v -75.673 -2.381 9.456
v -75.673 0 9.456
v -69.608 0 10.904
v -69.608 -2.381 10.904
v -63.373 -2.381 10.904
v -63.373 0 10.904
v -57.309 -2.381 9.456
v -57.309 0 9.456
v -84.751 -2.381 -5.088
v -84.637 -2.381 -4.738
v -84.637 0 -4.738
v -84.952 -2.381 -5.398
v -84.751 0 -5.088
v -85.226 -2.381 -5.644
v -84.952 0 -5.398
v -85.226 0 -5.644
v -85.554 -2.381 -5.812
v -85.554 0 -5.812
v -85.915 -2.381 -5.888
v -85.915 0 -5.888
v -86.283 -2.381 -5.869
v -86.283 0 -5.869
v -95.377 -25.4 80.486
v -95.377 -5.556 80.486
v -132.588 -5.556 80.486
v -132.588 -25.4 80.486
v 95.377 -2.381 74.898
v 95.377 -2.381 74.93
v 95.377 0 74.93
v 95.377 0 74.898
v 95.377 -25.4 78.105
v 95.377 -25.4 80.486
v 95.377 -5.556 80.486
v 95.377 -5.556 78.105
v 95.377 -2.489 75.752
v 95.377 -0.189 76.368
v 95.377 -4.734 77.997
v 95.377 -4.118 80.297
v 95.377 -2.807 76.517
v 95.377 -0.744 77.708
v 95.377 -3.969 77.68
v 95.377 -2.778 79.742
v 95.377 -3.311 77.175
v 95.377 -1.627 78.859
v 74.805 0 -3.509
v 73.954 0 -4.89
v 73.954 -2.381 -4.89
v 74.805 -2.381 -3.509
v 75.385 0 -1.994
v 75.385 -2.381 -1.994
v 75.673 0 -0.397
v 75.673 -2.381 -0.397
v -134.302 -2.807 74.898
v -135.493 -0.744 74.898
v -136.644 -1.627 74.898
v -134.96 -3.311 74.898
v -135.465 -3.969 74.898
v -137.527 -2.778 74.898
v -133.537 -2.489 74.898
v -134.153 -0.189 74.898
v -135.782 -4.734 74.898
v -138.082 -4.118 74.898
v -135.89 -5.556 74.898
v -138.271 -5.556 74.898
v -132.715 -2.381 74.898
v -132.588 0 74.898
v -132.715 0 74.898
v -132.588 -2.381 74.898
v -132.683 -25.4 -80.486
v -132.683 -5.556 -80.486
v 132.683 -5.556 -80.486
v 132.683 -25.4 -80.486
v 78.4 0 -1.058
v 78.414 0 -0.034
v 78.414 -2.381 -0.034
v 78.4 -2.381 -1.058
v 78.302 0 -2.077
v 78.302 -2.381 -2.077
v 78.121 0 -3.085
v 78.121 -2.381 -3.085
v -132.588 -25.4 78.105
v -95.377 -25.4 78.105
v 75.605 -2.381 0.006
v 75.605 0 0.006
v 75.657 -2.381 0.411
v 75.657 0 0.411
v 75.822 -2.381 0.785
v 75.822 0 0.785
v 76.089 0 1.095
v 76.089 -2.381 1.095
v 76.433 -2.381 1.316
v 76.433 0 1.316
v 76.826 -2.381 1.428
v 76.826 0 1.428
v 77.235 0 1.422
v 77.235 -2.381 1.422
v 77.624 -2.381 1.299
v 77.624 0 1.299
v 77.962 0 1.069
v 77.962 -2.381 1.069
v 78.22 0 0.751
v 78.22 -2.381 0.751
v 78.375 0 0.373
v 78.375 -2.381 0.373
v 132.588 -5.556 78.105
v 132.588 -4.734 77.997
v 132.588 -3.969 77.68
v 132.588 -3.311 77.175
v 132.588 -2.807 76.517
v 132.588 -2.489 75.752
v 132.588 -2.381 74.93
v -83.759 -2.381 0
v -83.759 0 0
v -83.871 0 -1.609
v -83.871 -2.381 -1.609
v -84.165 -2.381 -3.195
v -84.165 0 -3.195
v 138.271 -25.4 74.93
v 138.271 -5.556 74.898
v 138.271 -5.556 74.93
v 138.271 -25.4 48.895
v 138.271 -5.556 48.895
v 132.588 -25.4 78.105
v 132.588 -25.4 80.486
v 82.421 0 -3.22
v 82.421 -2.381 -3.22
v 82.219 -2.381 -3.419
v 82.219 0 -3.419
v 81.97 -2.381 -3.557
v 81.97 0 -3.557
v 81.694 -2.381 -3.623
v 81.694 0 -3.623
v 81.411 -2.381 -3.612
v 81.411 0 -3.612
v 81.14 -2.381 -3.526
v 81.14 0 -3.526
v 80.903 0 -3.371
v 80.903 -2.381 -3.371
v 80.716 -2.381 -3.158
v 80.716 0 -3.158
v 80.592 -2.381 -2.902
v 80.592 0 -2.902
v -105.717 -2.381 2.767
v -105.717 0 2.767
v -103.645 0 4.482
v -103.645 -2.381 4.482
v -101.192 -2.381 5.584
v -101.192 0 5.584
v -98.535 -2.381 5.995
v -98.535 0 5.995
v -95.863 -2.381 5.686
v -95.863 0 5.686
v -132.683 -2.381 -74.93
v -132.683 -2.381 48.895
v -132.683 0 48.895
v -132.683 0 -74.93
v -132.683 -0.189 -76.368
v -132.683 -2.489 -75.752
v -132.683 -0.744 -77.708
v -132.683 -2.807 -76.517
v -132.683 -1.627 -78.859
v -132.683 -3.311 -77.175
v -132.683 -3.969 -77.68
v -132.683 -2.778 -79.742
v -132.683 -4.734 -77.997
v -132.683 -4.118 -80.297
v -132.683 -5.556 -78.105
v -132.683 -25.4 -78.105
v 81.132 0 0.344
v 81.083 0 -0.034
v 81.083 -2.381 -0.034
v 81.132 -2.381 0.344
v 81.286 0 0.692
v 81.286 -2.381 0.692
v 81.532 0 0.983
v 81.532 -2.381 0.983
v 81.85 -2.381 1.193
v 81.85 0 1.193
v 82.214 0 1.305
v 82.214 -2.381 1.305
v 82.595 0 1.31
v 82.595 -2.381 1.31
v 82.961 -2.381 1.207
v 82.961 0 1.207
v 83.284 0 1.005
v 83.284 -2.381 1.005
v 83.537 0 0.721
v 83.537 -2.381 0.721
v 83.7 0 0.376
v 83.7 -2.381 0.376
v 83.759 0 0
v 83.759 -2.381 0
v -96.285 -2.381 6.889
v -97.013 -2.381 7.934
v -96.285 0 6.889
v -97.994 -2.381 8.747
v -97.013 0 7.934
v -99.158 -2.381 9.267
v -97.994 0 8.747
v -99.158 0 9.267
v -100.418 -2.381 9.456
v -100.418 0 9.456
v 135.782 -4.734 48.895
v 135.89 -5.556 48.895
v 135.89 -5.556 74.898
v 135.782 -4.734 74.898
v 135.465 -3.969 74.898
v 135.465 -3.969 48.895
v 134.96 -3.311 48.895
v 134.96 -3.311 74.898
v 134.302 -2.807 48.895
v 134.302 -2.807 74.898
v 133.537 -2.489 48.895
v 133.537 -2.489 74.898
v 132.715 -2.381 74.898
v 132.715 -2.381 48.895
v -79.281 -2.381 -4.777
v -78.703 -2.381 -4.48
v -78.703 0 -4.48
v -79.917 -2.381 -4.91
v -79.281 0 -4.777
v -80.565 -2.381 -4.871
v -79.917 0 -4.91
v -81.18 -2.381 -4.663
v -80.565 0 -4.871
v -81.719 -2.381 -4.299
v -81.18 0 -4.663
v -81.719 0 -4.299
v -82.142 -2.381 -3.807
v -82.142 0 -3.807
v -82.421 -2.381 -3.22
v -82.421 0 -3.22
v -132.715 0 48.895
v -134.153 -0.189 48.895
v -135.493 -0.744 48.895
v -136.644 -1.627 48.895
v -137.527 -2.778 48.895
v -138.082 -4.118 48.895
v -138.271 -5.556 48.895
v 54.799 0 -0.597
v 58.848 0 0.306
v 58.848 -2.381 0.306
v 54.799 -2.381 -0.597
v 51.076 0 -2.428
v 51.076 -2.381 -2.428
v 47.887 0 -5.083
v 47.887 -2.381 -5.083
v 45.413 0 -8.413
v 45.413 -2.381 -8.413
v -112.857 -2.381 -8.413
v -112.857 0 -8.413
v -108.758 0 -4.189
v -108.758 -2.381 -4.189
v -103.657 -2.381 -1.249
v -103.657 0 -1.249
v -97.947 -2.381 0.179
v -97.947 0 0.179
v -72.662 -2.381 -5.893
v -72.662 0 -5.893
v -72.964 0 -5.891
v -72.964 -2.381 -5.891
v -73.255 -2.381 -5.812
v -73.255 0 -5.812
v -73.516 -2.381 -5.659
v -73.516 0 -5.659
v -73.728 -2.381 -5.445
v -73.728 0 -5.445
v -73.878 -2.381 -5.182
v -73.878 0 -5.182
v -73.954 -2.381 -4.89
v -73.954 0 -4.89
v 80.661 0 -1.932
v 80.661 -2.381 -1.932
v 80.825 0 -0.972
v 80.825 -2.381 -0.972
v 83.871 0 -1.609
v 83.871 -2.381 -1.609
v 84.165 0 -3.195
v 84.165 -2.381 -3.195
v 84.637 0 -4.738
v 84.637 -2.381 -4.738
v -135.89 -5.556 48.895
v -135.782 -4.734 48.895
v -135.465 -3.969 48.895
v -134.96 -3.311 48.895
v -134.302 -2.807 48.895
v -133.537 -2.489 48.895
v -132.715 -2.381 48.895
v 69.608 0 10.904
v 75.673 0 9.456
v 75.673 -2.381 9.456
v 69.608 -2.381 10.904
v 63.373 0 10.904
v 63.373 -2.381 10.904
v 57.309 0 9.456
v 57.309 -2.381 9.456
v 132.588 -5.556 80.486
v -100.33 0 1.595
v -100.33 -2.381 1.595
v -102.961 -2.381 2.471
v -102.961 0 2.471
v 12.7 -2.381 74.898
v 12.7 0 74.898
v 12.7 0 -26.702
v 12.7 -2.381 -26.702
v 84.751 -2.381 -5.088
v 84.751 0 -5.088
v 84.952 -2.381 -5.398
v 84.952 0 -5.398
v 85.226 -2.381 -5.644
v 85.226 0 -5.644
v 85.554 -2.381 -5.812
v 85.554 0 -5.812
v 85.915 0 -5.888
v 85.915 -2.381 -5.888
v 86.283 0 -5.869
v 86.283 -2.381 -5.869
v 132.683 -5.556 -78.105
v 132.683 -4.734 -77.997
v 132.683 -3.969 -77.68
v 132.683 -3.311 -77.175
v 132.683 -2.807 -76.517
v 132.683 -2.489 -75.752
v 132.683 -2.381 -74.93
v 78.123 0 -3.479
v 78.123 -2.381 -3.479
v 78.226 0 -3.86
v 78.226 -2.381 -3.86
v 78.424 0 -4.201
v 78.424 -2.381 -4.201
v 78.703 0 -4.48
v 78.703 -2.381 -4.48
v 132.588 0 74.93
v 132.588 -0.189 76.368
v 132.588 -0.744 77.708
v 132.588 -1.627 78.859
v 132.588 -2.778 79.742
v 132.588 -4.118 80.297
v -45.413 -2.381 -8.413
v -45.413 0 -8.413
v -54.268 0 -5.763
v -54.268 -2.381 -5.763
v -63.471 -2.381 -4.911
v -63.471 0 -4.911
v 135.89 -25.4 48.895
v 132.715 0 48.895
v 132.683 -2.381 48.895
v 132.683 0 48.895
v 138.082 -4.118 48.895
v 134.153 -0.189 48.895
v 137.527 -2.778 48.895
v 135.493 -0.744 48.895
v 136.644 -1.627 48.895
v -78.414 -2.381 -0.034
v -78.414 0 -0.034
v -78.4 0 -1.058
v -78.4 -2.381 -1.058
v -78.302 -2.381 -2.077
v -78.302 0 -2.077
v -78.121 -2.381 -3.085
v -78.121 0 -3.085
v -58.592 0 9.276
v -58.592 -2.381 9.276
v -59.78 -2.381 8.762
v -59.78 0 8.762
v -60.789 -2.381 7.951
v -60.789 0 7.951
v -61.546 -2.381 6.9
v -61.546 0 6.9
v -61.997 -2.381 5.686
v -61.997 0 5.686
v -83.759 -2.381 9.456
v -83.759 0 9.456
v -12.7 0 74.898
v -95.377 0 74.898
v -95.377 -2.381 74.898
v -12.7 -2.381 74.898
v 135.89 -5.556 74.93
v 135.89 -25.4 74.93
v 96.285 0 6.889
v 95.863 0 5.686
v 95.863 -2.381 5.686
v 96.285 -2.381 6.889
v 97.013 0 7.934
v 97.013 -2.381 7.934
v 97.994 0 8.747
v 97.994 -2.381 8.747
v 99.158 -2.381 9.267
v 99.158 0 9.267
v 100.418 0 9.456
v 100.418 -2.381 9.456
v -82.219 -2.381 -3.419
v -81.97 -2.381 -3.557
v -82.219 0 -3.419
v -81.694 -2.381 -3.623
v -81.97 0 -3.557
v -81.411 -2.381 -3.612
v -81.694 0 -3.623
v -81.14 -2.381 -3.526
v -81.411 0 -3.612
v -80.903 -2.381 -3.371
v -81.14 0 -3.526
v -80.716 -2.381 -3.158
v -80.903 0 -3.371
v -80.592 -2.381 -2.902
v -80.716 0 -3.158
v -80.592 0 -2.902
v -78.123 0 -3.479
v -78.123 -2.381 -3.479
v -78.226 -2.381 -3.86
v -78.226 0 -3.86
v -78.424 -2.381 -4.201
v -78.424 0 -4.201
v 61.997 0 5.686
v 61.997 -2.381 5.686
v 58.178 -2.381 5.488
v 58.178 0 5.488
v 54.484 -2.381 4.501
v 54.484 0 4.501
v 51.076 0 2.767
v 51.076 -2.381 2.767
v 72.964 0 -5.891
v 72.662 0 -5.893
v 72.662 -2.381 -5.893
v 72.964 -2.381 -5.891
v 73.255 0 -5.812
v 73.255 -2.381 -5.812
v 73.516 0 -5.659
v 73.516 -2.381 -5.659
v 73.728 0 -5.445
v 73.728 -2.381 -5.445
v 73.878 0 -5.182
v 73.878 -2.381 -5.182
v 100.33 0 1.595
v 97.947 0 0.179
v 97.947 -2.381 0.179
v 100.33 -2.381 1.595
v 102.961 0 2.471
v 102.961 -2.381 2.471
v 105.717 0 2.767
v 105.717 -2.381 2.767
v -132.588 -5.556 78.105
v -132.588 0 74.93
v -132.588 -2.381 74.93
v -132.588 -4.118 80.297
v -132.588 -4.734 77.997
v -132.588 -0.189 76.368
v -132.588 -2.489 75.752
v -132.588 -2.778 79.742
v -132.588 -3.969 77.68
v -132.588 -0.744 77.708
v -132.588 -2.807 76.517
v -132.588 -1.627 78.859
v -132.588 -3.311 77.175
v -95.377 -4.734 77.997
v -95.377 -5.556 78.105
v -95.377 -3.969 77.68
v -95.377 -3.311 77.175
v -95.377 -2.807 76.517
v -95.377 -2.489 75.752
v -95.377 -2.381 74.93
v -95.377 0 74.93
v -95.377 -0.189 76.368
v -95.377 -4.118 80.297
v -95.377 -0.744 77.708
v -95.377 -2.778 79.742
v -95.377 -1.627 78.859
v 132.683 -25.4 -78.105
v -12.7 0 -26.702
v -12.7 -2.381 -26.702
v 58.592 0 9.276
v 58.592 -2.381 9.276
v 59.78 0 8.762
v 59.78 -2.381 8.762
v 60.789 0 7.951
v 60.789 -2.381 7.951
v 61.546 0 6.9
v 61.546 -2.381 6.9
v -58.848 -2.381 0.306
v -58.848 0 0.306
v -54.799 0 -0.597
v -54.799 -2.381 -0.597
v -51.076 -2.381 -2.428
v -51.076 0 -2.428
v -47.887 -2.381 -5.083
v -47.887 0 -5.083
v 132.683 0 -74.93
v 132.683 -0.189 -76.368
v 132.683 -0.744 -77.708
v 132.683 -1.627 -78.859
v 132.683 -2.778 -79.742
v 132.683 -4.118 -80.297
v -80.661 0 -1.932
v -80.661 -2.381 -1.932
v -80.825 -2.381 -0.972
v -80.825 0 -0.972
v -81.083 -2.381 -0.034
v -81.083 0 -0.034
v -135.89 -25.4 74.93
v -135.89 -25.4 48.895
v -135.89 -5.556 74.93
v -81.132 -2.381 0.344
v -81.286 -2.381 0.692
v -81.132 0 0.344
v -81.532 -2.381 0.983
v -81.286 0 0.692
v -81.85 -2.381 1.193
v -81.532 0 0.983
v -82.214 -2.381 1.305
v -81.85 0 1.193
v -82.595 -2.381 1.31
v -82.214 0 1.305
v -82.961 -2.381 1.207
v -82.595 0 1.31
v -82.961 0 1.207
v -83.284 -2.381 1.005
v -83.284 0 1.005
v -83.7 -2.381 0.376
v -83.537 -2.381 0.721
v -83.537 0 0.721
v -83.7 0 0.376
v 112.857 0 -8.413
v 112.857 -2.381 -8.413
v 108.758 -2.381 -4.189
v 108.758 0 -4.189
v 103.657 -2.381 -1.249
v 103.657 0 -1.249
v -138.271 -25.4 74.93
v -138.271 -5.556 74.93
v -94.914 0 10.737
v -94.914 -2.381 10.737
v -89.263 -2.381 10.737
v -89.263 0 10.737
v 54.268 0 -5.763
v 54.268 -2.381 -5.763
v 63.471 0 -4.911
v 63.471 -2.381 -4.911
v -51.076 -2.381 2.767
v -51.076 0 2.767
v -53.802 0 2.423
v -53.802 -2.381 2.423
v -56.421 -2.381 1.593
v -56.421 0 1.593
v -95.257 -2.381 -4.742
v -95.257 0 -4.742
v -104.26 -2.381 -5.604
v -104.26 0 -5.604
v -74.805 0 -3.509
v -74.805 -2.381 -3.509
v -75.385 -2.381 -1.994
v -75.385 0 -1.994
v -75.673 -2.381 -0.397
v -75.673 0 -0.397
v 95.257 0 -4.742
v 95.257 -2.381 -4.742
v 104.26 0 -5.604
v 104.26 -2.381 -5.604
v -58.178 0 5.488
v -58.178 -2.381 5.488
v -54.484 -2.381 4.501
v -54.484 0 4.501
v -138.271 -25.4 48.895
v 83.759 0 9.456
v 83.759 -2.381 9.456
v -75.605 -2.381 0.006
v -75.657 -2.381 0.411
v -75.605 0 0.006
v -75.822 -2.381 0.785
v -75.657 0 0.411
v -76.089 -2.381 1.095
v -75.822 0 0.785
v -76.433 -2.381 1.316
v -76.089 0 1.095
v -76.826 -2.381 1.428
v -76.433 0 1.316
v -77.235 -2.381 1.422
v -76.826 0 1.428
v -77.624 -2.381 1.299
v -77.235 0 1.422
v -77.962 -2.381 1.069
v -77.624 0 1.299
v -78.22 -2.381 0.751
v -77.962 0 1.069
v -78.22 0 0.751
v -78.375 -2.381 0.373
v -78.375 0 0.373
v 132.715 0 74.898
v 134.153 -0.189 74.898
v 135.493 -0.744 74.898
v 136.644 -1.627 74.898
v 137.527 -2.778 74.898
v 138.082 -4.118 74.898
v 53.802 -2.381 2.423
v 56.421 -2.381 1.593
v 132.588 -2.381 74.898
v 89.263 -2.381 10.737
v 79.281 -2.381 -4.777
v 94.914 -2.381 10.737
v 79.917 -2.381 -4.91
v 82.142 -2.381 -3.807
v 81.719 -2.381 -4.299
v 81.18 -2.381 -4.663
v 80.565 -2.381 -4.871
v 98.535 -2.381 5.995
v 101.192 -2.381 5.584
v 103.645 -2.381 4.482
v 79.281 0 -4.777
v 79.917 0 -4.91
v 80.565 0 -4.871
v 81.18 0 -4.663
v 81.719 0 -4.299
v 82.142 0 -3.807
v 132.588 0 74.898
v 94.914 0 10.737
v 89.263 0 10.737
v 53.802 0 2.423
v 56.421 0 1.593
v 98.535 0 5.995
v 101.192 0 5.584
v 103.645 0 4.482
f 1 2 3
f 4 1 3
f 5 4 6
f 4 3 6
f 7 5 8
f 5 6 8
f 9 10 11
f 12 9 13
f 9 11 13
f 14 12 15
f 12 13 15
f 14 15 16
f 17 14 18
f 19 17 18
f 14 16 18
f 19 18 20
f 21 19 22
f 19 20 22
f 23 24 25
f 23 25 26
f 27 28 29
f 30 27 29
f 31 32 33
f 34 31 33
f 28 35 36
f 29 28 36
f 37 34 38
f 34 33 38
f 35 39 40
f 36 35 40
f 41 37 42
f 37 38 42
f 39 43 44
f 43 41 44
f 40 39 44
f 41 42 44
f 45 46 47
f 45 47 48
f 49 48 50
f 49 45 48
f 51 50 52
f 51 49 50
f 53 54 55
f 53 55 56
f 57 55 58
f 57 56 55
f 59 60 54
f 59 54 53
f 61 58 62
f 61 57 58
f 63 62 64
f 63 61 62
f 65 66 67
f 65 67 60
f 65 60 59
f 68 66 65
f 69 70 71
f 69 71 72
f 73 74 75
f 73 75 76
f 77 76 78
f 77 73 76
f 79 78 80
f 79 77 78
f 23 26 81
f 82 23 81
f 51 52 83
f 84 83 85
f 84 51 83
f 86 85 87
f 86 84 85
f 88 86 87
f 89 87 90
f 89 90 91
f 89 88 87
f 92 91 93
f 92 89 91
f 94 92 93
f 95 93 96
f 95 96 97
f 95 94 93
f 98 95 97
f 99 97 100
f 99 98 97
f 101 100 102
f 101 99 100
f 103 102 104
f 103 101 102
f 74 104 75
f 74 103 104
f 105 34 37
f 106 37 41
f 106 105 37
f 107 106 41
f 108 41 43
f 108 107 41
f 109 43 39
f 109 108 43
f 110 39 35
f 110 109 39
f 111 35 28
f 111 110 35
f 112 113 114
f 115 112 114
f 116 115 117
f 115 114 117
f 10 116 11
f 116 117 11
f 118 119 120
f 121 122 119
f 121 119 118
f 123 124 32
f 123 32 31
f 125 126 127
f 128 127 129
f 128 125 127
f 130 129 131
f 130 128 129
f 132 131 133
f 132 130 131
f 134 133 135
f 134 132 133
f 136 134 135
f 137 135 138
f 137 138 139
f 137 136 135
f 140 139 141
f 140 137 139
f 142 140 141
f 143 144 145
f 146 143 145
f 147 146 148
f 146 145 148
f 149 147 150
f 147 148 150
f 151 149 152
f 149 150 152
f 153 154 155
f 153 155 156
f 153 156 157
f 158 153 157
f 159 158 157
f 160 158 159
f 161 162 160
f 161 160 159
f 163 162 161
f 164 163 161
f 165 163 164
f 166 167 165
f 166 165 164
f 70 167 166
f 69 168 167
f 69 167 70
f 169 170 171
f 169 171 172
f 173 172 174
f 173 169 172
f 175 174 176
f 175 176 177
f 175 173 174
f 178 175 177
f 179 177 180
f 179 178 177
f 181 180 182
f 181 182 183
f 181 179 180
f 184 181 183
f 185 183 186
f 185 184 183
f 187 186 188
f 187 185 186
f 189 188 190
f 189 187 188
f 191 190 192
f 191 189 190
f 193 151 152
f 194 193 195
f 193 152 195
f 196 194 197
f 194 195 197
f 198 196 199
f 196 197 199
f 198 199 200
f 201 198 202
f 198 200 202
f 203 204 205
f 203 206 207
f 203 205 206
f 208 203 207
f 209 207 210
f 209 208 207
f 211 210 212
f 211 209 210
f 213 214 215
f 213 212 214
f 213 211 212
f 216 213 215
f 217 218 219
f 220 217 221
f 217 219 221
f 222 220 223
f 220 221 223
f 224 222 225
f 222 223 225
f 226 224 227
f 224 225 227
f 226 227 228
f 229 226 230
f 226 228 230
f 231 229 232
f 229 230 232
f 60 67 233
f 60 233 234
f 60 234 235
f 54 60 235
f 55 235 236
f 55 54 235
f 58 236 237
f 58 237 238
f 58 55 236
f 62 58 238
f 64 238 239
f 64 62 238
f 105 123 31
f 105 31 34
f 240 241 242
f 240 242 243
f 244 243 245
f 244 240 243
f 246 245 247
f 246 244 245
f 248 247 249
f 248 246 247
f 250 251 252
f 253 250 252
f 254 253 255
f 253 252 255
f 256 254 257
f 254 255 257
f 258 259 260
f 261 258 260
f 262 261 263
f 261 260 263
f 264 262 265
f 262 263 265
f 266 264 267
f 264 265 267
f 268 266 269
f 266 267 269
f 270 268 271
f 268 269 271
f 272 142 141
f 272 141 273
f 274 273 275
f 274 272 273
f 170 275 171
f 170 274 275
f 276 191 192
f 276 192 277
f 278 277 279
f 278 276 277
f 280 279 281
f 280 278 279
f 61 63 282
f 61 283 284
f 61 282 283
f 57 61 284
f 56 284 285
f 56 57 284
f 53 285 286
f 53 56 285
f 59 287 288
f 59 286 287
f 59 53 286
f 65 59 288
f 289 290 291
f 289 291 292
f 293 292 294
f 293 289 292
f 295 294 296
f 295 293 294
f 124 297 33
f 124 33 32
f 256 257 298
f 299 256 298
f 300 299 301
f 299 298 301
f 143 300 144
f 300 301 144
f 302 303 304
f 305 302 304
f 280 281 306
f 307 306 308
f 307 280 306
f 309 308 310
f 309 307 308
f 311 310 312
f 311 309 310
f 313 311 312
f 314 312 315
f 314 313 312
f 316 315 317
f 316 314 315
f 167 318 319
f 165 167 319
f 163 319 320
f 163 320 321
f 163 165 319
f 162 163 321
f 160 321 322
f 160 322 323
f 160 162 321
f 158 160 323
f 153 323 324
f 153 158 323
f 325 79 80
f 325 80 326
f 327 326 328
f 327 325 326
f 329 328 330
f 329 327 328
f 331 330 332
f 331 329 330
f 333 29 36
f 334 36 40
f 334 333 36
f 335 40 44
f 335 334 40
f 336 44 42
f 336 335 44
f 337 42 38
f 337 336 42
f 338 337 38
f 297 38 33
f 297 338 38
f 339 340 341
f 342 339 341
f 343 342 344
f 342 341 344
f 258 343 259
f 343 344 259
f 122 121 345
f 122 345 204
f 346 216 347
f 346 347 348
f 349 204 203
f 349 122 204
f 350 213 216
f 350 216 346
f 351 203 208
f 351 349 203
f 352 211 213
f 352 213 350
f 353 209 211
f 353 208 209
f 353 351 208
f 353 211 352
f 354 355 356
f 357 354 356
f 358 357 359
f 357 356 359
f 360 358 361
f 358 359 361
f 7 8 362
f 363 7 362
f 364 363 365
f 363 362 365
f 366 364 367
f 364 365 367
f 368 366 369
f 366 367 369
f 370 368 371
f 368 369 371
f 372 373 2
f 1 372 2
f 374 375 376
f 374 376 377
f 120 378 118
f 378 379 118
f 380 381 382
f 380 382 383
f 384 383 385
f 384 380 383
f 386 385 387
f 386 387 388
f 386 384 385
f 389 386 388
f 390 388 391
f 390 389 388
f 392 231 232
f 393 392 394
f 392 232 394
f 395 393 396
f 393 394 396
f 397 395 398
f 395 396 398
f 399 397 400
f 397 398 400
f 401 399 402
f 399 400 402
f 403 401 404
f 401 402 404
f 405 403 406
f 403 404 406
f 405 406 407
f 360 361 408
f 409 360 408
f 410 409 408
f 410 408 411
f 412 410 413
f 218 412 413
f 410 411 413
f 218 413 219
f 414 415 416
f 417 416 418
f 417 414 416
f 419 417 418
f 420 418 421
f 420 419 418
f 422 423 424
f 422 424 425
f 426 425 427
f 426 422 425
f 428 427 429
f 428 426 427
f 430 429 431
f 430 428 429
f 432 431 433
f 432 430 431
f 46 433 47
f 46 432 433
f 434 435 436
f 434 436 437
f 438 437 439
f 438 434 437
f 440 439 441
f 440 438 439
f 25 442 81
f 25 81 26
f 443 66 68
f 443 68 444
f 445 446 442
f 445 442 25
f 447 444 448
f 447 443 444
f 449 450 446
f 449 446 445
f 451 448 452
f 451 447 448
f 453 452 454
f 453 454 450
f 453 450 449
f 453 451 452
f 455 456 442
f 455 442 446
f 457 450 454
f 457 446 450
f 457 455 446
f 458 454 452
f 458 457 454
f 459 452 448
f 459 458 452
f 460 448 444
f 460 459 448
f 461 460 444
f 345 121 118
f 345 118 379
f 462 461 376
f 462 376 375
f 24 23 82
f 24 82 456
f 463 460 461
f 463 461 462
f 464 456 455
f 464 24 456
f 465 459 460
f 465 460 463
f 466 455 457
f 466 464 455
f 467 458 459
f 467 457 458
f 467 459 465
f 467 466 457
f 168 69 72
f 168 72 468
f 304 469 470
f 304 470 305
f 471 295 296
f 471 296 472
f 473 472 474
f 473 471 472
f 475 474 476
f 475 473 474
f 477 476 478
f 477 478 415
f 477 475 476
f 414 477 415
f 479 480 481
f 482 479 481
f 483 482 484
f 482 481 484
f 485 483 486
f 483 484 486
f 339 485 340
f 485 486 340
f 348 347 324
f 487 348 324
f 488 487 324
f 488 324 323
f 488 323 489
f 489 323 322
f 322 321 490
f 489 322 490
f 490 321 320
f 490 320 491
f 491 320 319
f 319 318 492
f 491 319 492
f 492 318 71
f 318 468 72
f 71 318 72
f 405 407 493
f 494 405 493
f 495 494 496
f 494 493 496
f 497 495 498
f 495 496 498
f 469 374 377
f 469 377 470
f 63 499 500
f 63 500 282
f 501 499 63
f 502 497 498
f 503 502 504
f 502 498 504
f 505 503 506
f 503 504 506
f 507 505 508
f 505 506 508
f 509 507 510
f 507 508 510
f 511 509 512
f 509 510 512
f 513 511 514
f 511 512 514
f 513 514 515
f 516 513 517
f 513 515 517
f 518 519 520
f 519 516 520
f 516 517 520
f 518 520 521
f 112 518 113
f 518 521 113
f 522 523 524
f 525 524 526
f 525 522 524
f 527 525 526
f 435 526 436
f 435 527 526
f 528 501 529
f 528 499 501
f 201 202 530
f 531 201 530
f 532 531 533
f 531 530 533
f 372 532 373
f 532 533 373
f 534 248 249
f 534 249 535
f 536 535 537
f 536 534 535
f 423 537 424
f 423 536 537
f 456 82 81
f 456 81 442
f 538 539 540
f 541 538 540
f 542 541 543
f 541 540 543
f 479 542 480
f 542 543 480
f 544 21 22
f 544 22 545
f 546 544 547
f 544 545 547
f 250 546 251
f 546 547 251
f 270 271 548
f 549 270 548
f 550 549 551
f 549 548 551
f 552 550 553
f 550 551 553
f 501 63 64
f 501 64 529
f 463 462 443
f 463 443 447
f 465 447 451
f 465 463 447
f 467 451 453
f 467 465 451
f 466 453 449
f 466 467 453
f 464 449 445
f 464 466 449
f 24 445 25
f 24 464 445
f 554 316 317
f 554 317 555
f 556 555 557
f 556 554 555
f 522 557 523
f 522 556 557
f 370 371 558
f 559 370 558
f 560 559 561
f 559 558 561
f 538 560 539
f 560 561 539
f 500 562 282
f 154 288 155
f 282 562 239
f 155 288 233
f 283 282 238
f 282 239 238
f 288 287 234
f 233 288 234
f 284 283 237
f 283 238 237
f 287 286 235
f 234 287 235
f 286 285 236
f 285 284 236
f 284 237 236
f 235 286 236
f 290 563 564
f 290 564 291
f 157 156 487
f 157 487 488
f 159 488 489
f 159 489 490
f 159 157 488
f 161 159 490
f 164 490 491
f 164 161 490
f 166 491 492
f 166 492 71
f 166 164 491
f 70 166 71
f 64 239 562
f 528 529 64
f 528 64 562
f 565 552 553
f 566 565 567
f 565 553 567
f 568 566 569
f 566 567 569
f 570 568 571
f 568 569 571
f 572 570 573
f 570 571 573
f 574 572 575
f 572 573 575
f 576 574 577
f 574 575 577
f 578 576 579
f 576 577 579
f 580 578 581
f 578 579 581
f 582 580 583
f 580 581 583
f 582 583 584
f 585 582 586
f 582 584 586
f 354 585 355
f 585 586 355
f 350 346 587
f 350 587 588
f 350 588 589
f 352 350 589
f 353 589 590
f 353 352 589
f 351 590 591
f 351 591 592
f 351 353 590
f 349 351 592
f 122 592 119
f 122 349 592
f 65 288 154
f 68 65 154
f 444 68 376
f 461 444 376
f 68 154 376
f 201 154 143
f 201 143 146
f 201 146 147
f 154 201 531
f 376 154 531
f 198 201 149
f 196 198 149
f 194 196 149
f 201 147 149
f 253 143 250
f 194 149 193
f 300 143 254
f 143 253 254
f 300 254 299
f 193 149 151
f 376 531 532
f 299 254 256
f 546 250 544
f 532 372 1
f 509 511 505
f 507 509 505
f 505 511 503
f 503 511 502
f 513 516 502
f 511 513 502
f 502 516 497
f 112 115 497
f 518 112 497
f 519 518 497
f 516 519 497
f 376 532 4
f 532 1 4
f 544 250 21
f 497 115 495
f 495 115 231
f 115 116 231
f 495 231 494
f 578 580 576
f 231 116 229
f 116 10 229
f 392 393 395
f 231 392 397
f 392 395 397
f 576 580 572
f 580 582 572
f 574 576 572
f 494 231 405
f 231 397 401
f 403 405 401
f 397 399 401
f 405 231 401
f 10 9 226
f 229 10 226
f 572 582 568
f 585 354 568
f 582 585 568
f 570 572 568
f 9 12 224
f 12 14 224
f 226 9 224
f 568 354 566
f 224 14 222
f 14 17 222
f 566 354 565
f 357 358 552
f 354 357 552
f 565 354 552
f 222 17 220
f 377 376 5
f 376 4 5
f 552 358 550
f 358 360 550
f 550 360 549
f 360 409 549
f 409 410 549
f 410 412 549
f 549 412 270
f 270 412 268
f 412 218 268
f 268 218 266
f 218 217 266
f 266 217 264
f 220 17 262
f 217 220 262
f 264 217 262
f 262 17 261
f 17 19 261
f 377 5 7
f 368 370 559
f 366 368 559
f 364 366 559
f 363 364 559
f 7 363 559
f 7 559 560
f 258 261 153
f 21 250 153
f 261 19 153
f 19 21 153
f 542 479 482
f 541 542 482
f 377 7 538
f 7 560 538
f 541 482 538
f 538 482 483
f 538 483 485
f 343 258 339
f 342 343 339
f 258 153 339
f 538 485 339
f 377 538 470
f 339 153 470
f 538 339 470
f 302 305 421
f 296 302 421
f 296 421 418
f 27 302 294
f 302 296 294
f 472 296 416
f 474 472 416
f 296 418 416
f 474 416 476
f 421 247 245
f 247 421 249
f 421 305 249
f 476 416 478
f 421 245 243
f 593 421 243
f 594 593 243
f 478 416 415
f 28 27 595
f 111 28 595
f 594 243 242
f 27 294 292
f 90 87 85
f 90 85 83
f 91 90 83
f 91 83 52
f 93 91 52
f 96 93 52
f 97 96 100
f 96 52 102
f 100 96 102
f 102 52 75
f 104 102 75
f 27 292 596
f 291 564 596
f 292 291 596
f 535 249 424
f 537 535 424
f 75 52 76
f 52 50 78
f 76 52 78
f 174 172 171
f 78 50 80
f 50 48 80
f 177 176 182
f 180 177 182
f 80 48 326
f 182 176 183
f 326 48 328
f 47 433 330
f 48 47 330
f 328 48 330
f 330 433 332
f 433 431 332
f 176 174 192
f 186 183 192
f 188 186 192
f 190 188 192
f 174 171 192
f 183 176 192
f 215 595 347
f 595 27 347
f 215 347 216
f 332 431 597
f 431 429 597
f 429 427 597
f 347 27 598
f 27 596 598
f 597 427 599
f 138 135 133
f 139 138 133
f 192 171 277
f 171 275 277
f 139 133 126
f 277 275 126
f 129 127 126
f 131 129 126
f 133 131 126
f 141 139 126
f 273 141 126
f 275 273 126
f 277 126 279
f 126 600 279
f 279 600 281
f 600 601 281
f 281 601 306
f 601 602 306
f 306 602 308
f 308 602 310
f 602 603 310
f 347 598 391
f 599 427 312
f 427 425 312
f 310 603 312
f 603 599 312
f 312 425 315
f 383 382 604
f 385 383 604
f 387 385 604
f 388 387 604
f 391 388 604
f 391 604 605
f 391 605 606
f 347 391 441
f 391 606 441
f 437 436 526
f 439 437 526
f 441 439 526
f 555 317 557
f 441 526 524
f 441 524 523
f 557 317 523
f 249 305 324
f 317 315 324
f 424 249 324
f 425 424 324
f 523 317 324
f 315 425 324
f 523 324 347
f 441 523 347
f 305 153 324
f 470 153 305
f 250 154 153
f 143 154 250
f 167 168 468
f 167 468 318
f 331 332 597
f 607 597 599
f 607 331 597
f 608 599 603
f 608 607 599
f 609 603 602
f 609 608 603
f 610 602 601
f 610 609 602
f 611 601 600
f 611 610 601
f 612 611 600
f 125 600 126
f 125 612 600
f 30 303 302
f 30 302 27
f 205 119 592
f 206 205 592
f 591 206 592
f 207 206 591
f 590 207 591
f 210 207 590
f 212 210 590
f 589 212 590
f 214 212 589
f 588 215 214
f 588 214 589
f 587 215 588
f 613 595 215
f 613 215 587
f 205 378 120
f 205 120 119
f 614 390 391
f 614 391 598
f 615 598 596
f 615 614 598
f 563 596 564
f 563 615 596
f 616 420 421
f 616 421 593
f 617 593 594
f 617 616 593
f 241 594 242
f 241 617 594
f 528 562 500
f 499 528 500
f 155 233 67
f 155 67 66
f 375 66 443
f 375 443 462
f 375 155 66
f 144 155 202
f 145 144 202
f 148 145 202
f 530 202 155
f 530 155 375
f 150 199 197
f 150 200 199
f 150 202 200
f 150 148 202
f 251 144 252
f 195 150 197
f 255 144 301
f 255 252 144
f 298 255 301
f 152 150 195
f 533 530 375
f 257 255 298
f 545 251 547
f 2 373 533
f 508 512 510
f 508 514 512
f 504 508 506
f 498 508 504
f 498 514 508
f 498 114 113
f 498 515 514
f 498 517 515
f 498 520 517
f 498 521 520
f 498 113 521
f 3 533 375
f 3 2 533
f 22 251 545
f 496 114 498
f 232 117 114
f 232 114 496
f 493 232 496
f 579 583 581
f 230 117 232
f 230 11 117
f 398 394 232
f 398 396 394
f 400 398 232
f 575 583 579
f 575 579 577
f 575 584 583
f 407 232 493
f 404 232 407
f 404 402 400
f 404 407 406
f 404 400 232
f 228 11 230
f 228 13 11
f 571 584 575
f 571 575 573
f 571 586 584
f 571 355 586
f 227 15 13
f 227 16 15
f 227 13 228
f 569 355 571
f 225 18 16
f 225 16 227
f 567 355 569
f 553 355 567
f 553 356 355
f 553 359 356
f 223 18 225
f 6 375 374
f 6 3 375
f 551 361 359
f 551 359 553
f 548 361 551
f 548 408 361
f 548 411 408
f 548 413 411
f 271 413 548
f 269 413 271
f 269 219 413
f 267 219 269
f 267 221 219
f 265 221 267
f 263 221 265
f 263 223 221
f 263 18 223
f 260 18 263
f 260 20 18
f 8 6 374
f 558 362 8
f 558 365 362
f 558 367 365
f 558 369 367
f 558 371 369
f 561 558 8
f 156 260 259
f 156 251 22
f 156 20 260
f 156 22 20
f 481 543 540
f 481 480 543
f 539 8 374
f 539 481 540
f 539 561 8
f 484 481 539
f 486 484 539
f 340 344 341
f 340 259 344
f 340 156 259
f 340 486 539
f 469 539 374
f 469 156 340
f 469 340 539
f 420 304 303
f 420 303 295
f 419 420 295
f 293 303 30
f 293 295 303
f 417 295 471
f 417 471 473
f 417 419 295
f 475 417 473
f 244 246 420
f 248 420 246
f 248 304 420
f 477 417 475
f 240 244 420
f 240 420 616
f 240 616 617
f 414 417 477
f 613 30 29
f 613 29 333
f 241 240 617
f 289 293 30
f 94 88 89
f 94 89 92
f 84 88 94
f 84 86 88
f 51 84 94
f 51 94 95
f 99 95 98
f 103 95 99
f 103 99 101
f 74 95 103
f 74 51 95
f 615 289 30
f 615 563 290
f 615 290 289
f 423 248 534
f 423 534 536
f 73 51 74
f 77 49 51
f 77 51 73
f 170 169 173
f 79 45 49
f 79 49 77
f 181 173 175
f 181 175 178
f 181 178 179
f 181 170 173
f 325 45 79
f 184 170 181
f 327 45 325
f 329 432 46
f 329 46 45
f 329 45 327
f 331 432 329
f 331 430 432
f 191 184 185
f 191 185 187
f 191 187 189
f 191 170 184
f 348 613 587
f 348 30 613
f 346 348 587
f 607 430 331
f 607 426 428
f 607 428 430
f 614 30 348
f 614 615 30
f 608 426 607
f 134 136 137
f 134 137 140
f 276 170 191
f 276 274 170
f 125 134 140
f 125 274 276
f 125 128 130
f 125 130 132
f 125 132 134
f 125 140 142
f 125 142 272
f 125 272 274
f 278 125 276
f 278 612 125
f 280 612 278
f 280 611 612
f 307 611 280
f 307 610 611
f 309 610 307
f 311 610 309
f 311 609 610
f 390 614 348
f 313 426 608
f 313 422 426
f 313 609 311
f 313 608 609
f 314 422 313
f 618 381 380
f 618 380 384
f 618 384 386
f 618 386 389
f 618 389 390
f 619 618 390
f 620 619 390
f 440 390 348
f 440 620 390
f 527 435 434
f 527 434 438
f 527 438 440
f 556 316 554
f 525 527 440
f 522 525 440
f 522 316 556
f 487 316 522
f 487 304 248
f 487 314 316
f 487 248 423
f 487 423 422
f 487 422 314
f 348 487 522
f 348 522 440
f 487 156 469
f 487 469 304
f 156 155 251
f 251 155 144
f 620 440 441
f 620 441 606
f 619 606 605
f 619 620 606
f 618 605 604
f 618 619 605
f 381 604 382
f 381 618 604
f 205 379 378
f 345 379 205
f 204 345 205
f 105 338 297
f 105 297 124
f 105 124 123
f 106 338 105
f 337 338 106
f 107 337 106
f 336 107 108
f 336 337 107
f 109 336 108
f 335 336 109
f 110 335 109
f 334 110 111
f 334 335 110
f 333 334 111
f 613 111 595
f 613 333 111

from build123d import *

# Parameters (mm, degrees)
SKETCH1_W                    = 271.78
SKETCH1_H                    = 156.21
BASE_FLANGE1_DEPTH           = 2.38125
EDGE_FLANGE1_STRIP_W         = 15.875
EDGE_FLANGE1_STRIP_H         = 2.38125
EDGE_FLANGE1_STRIP_CUT_DEPTH = 271.78
EDGE_FLANGE1_DEPTH           = 271.78
EDGE_FLANGE2_STRIP_W         = 15.875
EDGE_FLANGE2_STRIP_H         = 2.38125
EDGE_FLANGE2_STRIP_CUT_DEPTH = 153.035
EDGE_FLANGE2_DEPTH           = 153.035
SKETCH14_W                   = 127
SKETCH14_H                   = 30.097595223
CUT_EXTRUDE1_DEPTH           = 5.588
EDGE_FLANGE3_STRIP_W         = 15.875
EDGE_FLANGE3_STRIP_H         = 2.38125
EDGE_FLANGE3_STRIP_CUT_DEPTH = 153.035
EDGE_FLANGE3_DEPTH           = 153.035
SKETCH18_W                   = 127
SKETCH18_H                   = 45.504454023
CUT_EXTRUDE2_DEPTH           = 5.588
CUT_EXTRUDE3_START           = -3.302
CUT_EXTRUDE3_DEPTH           = 5.68325
CUT_EXTRUDE4_START           = -3.302
CUT_EXTRUDE4_DEPTH           = 5.68325
EDGE_FLANGE4_STRIP_W         = 15.875
EDGE_FLANGE4_STRIP_H         = 2.38125
EDGE_FLANGE4_STRIP_CUT_DEPTH = 265.3665
EDGE_FLANGE4_DEPTH           = 265.3665
SKETCH24_W                   = 190.754
SKETCH24_H                   = 70.532416994
CUT_EXTRUDE5_DEPTH           = 5.588
SKETCH25_W                   = 25.4
SKETCH25_H                   = 203.2
CUT_EXTRUDE6_DEPTH           = 2.54
CUT_EXTRUDE7_DEPTH           = 162.994243773


# Read off the part's stored shape, not the designer's step: Cut-Extrude3, Cut-Extrude4
# Sheet-metal steps are written as plain solids
with BuildPart() as part:
    # Sketch1 → Base-Flange1 (new body)
    with BuildSketch(Plane(origin=(0, 0, 0), x_dir=(1, 0, 0), z_dir=(0, 1, 0))):
        Rectangle(SKETCH1_W, SKETCH1_H)
    extrude(amount=-BASE_FLANGE1_DEPTH)

    # Edge-Flange1 strip (across the edge) → Edge-Flange1 strip cut (cut)
    with BuildSketch(Plane(origin=(135.89, -2.38125, 78.105), x_dir=(0, 0, -1), z_dir=(-1, 0, 0))):
        with Locations((-4.7625, -1.190625)):
            Rectangle(EDGE_FLANGE1_STRIP_W, EDGE_FLANGE1_STRIP_H)
    extrude(amount=EDGE_FLANGE1_STRIP_CUT_DEPTH, mode=Mode.SUBTRACT)

    # Edge-Flange1 section (across the edge) → Edge-Flange1 (add)
    with BuildSketch(Plane(origin=(135.89, -2.38125, 78.105), x_dir=(0, 0, -1), z_dir=(-1, 0, 0))):
        with BuildLine():
            Line((-2.38125, 3.175), (-2.38125, 23.01875))
            Line((-2.38125, 23.01875), (0, 23.01875))
            Line((0, 23.01875), (0, 3.175))
            ThreePointArc((0, 3.175), (0.92993597, 0.92993597), (3.175, 0))
            Line((3.175, 0), (3.175, -2.38125))
            ThreePointArc((3.175, -2.38125), (-0.753862053, -0.753862053), (-2.38125, 3.175))
        make_face()
    extrude(amount=EDGE_FLANGE1_DEPTH)

    # Edge-Flange2 strip (across the edge) → Edge-Flange2 strip cut (cut)
    with BuildSketch(Plane(origin=(135.89, -2.38125, -78.105), x_dir=(-1, 0, 0), z_dir=(0, 0, 1))):
        with Locations((-4.7625, -1.190625)):
            Rectangle(EDGE_FLANGE2_STRIP_W, EDGE_FLANGE2_STRIP_H)
    extrude(amount=EDGE_FLANGE2_STRIP_CUT_DEPTH, mode=Mode.SUBTRACT)

    # Edge-Flange2 section (across the edge) → Edge-Flange2 (add)
    with BuildSketch(Plane(origin=(135.89, -2.38125, -78.105), x_dir=(-1, 0, 0), z_dir=(0, 0, 1))):
        with BuildLine():
            Line((-2.38125, 3.175), (-2.38125, 23.01875))
            Line((-2.38125, 23.01875), (0, 23.01875))
            Line((0, 23.01875), (0, 3.175))
            ThreePointArc((0, 3.175), (0.92993597, 0.92993597), (3.175, 0))
            Line((3.175, 0), (3.175, -2.38125))
            ThreePointArc((3.175, -2.38125), (-0.753862053, -0.753862053), (-2.38125, 3.175))
        make_face()
    extrude(amount=EDGE_FLANGE2_DEPTH)

    # Sketch14 → Cut-Extrude1 (cut)
    with BuildSketch(Plane(origin=(138.27125, 0, 0), x_dir=(0, 0, -1), z_dir=(1, 0, 0))):
        with Locations((14.605, -10.351202389)):
            Rectangle(SKETCH14_W, SKETCH14_H)
    extrude(amount=-CUT_EXTRUDE1_DEPTH, mode=Mode.SUBTRACT)

    # Edge-Flange3 strip (across the edge) → Edge-Flange3 strip cut (cut)
    with BuildSketch(Plane(origin=(-135.89, -2.38125, 74.93), x_dir=(1, 0, 0), z_dir=(0, 0, -1))):
        with Locations((-4.7625, -1.190625)):
            Rectangle(EDGE_FLANGE3_STRIP_W, EDGE_FLANGE3_STRIP_H)
    extrude(amount=EDGE_FLANGE3_STRIP_CUT_DEPTH, mode=Mode.SUBTRACT)

    # Edge-Flange3 section (across the edge) → Edge-Flange3 (add)
    with BuildSketch(Plane(origin=(-135.89, -2.38125, 74.93), x_dir=(1, 0, 0), z_dir=(0, 0, -1))):
        with BuildLine():
            Line((-2.38125, 3.175), (-2.38125, 23.01875))
            Line((-2.38125, 23.01875), (0, 23.01875))
            Line((0, 23.01875), (0, 3.175))
            ThreePointArc((0, 3.175), (0.92993597, 0.92993597), (3.175, 0))
            Line((3.175, 0), (3.175, -2.38125))
            ThreePointArc((3.175, -2.38125), (-0.753862053, -0.753862053), (-2.38125, 3.175))
        make_face()
    extrude(amount=EDGE_FLANGE3_DEPTH)

    # Sketch18 → Cut-Extrude2 (cut)
    with BuildSketch(Plane.ZY.offset(138.27125)):
        with Locations((-14.605, -2.647772988)):
            Rectangle(SKETCH18_W, SKETCH18_H)
    extrude(amount=-CUT_EXTRUDE2_DEPTH, mode=Mode.SUBTRACT)

    # Cut-Extrude3 outline → Cut-Extrude3 (cut)
    with BuildSketch(Plane.ZY.offset(135.89).offset(CUT_EXTRUDE3_START)):
        with BuildLine():
            Line((74.93, 0), (74.89825, 0))
            Line((74.89825, 0), (74.89825, -5.55625))
            Line((74.89825, -5.55625), (74.93, -5.55625))
            Line((74.93, -5.55625), (74.93, -2.38125))
            ThreePointArc((74.93, -2.38125), (77.17506403, -3.31118597), (78.105, -5.55625))
            Line((78.105, -5.55625), (78.105, -25.4))
            Line((78.105, -25.4), (80.48625, -25.4))
            Line((80.48625, -25.4), (80.48625, -5.55625))
            ThreePointArc((80.48625, -5.55625), (78.858862053, -1.627387947), (74.93, 0))
        make_face()
    extrude(amount=CUT_EXTRUDE3_DEPTH, mode=Mode.SUBTRACT)

    # Cut-Extrude4 outline → Cut-Extrude4 (cut)
    with BuildSketch(Plane(origin=(135.89, 0, 0), x_dir=(0, 0, -1), z_dir=(1, 0, 0)).offset(CUT_EXTRUDE4_START)):
        with BuildLine():
            Line((-74.89825, 0), (-74.93, 0))
            ThreePointArc((-74.93, 0), (-78.858862053, -1.627387947), (-80.48625, -5.55625))
            Line((-80.48625, -5.55625), (-80.48625, -25.4))
            Line((-80.48625, -25.4), (-78.105, -25.4))
            Line((-78.105, -25.4), (-78.105, -5.55625))
            ThreePointArc((-78.105, -5.55625), (-77.17506403, -3.31118597), (-74.93, -2.38125))
            Line((-74.93, -2.38125), (-74.93, -5.55625))
            Line((-74.93, -5.55625), (-74.89825, -5.55625))
            Line((-74.89825, -5.55625), (-74.89825, 0))
        make_face()
    extrude(amount=CUT_EXTRUDE4_DEPTH, mode=Mode.SUBTRACT)

    # Edge-Flange4 strip (across the edge) → Edge-Flange4 strip cut (cut)
    with BuildSketch(Plane(origin=(-132.68325, -2.38125, -78.105), x_dir=(0, 0, 1), z_dir=(1, 0, 0))):
        with Locations((-4.7625, -1.190625)):
            Rectangle(EDGE_FLANGE4_STRIP_W, EDGE_FLANGE4_STRIP_H)
    extrude(amount=EDGE_FLANGE4_STRIP_CUT_DEPTH, mode=Mode.SUBTRACT)

    # Edge-Flange4 section (across the edge) → Edge-Flange4 (add)
    with BuildSketch(Plane(origin=(-132.68325, -2.38125, -78.105), x_dir=(0, 0, 1), z_dir=(1, 0, 0))):
        with BuildLine():
            Line((-2.38125, 3.175), (-2.38125, 23.01875))
            Line((-2.38125, 23.01875), (0, 23.01875))
            Line((0, 23.01875), (0, 3.175))
            ThreePointArc((0, 3.175), (0.92993597, 0.92993597), (3.175, 0))
            Line((3.175, 0), (3.175, -2.38125))
            ThreePointArc((3.175, -2.38125), (-0.753862053, -0.753862053), (-2.38125, 3.175))
        make_face()
    extrude(amount=EDGE_FLANGE4_DEPTH)

    # Sketch24 → Cut-Extrude5 (cut)
    with BuildSketch(Plane.XY.offset(80.48625)):
        Rectangle(SKETCH24_W, SKETCH24_H)
    extrude(amount=-CUT_EXTRUDE5_DEPTH, mode=Mode.SUBTRACT)

    # Sketch25 → Cut-Extrude6 (cut)
    with BuildSketch(Plane(origin=(0, 0, 0), x_dir=(1, 0, 0), z_dir=(0, 1, 0))):
        with Locations((0, -74.89825)):
            Rectangle(SKETCH25_W, SKETCH25_H)
    extrude(amount=-CUT_EXTRUDE6_DEPTH, mode=Mode.SUBTRACT)

    # Sketch27 → Cut-Extrude7 (cut, through all)
    with BuildSketch(Plane(origin=(0, 0, 0), x_dir=(1, 0, 0), z_dir=(0, 1, 0))):
        with BuildLine():
            Line((-83.758838792, -9.45585461), (-75.67290259, -9.45585461))
            ThreePointArc((-75.67290259, -9.45585461), (-66.490988533, -11.087337706), (-57.309074476, -9.45585461))
            ThreePointArc((-57.309074476, -9.45585461), (-60.311983549, -8.390373583), (-61.996874262, -5.685959414))
            ThreePointArc((-61.996874262, -5.685959414), (-56.305231118, -5.091134548), (-51.075646545, -2.767330875))
            ThreePointArc((-51.075646545, -2.767330875), (-55.130053613, -2.067384812), (-58.848260419, -0.305828877))
            ThreePointArc((-58.848260419, -0.305828877), (-51.075646545, 2.428004784), (-45.41334394, 8.413462337))
            ThreePointArc((-45.41334394, 8.413462337), (-58.848260419, 5.108292363), (-72.661500429, 5.892849412))
            ThreePointArc((-72.661500429, 5.892849412), (-73.515570568, 5.659234682), (-73.954298796, 4.890125335))
            ThreePointArc((-73.954298796, 4.890125335), (-75.13069526, 2.764954432), (-75.67290259, 0.397197853))
            ThreePointArc((-75.67290259, 0.397197853), (-76.825891015, -1.427766493), (-78.414472909, 0.033836989))
            ThreePointArc((-78.414472909, 0.033836989), (-78.361782981, 1.568210714), (-78.121423666, 3.084557099))
            ThreePointArc((-78.121423666, 3.084557099), (-78.226332012, 3.859871666), (-78.703089746, 4.480210688))
            ThreePointArc((-78.703089746, 4.480210688), (-80.87974367, 4.787634603), (-82.4208484, 3.22004793))
            ThreePointArc((-82.4208484, 3.22004793), (-81.410815763, 3.612426431), (-80.592319592, 2.902362466))
            ThreePointArc((-80.592319592, 2.902362466), (-80.7316121, 1.449976952), (-81.082858007, 0.033836989))
            ThreePointArc((-81.082858007, 0.033836989), (-82.403929905, -1.321071898), (-83.758838792, 0))
            ThreePointArc((-83.758838792, 0), (-83.995302952, 2.406365651), (-84.636907307, 4.737643154))
            ThreePointArc((-84.636907307, 4.737643154), (-85.225763559, 5.644402971), (-86.283323823, 5.869194738))
            ThreePointArc((-86.283323823, 5.869194738), (-99.782272929, 4.924826167), (-112.856785411, 8.413462337))
            ThreePointArc((-112.856785411, 8.413462337), (-106.309643061, 2.541856444), (-97.946894022, -0.179403782))
            ThreePointArc((-97.946894022, -0.179403782), (-101.622165605, -2.103854793), (-105.71739849, -2.767330875))
            ThreePointArc((-105.71739849, -2.767330875), (-101.192410266, -5.584137657), (-95.863287335, -5.685959414))
            ThreePointArc((-95.863287335, -5.685959414), (-97.475971718, -8.374084711), (-100.418171986, -9.45585461))
            ThreePointArc((-100.418171986, -9.45585461), (-92.088505389, -10.899131081), (-83.758838792, -9.45585461))
        make_face()
        with BuildLine():
            Line((83.758838792, -9.45585461), (75.67290259, -9.45585461))
            ThreePointArc((75.67290259, -9.45585461), (66.490988533, -11.087337706), (57.309074476, -9.45585461))
            ThreePointArc((57.309074476, -9.45585461), (60.311983549, -8.390373583), (61.996874262, -5.685959414))
            ThreePointArc((61.996874262, -5.685959414), (56.305231118, -5.091134548), (51.075646545, -2.767330875))
            ThreePointArc((51.075646545, -2.767330875), (55.130053613, -2.067384812), (58.848260419, -0.305828877))
            ThreePointArc((58.848260419, -0.305828877), (51.075646545, 2.428004784), (45.41334394, 8.413462337))
            ThreePointArc((45.41334394, 8.413462337), (58.848260419, 5.108292363), (72.661500429, 5.892849412))
            ThreePointArc((72.661500429, 5.892849412), (73.515570568, 5.659234682), (73.954298796, 4.890125335))
            ThreePointArc((73.954298796, 4.890125335), (75.13069526, 2.764954432), (75.67290259, 0.397197853))
            ThreePointArc((75.67290259, 0.397197853), (76.825891015, -1.427766493), (78.414472909, 0.033836989))
            ThreePointArc((78.414472909, 0.033836989), (78.361782981, 1.568210714), (78.121423666, 3.084557099))
            ThreePointArc((78.121423666, 3.084557099), (78.226332012, 3.859871666), (78.703089746, 4.480210688))
            ThreePointArc((78.703089746, 4.480210688), (80.87974367, 4.787634603), (82.4208484, 3.22004793))
            ThreePointArc((82.4208484, 3.22004793), (81.410815763, 3.612426431), (80.592319592, 2.902362466))
            ThreePointArc((80.592319592, 2.902362466), (80.7316121, 1.449976952), (81.082858007, 0.033836989))
            ThreePointArc((81.082858007, 0.033836989), (82.403929905, -1.321071898), (83.758838792, 0))
            ThreePointArc((83.758838792, 0), (83.995302952, 2.406365651), (84.636907307, 4.737643154))
            ThreePointArc((84.636907307, 4.737643154), (85.225763559, 5.644402971), (86.283323823, 5.869194738))
            ThreePointArc((86.283323823, 5.869194738), (99.782272929, 4.924826167), (112.856785411, 8.413462337))
            ThreePointArc((112.856785411, 8.413462337), (106.309643061, 2.541856444), (97.946894022, -0.179403782))
            ThreePointArc((97.946894022, -0.179403782), (101.622165605, -2.103854793), (105.71739849, -2.767330875))
            ThreePointArc((105.71739849, -2.767330875), (101.192410266, -5.584137657), (95.863287335, -5.685959414))
            ThreePointArc((95.863287335, -5.685959414), (97.475971718, -8.374084711), (100.418171986, -9.45585461))
            ThreePointArc((100.418171986, -9.45585461), (92.088505389, -10.899131081), (83.758838792, -9.45585461))
        make_face()
    extrude(amount=-CUT_EXTRUDE7_DEPTH, mode=Mode.SUBTRACT)


solid = part.part
